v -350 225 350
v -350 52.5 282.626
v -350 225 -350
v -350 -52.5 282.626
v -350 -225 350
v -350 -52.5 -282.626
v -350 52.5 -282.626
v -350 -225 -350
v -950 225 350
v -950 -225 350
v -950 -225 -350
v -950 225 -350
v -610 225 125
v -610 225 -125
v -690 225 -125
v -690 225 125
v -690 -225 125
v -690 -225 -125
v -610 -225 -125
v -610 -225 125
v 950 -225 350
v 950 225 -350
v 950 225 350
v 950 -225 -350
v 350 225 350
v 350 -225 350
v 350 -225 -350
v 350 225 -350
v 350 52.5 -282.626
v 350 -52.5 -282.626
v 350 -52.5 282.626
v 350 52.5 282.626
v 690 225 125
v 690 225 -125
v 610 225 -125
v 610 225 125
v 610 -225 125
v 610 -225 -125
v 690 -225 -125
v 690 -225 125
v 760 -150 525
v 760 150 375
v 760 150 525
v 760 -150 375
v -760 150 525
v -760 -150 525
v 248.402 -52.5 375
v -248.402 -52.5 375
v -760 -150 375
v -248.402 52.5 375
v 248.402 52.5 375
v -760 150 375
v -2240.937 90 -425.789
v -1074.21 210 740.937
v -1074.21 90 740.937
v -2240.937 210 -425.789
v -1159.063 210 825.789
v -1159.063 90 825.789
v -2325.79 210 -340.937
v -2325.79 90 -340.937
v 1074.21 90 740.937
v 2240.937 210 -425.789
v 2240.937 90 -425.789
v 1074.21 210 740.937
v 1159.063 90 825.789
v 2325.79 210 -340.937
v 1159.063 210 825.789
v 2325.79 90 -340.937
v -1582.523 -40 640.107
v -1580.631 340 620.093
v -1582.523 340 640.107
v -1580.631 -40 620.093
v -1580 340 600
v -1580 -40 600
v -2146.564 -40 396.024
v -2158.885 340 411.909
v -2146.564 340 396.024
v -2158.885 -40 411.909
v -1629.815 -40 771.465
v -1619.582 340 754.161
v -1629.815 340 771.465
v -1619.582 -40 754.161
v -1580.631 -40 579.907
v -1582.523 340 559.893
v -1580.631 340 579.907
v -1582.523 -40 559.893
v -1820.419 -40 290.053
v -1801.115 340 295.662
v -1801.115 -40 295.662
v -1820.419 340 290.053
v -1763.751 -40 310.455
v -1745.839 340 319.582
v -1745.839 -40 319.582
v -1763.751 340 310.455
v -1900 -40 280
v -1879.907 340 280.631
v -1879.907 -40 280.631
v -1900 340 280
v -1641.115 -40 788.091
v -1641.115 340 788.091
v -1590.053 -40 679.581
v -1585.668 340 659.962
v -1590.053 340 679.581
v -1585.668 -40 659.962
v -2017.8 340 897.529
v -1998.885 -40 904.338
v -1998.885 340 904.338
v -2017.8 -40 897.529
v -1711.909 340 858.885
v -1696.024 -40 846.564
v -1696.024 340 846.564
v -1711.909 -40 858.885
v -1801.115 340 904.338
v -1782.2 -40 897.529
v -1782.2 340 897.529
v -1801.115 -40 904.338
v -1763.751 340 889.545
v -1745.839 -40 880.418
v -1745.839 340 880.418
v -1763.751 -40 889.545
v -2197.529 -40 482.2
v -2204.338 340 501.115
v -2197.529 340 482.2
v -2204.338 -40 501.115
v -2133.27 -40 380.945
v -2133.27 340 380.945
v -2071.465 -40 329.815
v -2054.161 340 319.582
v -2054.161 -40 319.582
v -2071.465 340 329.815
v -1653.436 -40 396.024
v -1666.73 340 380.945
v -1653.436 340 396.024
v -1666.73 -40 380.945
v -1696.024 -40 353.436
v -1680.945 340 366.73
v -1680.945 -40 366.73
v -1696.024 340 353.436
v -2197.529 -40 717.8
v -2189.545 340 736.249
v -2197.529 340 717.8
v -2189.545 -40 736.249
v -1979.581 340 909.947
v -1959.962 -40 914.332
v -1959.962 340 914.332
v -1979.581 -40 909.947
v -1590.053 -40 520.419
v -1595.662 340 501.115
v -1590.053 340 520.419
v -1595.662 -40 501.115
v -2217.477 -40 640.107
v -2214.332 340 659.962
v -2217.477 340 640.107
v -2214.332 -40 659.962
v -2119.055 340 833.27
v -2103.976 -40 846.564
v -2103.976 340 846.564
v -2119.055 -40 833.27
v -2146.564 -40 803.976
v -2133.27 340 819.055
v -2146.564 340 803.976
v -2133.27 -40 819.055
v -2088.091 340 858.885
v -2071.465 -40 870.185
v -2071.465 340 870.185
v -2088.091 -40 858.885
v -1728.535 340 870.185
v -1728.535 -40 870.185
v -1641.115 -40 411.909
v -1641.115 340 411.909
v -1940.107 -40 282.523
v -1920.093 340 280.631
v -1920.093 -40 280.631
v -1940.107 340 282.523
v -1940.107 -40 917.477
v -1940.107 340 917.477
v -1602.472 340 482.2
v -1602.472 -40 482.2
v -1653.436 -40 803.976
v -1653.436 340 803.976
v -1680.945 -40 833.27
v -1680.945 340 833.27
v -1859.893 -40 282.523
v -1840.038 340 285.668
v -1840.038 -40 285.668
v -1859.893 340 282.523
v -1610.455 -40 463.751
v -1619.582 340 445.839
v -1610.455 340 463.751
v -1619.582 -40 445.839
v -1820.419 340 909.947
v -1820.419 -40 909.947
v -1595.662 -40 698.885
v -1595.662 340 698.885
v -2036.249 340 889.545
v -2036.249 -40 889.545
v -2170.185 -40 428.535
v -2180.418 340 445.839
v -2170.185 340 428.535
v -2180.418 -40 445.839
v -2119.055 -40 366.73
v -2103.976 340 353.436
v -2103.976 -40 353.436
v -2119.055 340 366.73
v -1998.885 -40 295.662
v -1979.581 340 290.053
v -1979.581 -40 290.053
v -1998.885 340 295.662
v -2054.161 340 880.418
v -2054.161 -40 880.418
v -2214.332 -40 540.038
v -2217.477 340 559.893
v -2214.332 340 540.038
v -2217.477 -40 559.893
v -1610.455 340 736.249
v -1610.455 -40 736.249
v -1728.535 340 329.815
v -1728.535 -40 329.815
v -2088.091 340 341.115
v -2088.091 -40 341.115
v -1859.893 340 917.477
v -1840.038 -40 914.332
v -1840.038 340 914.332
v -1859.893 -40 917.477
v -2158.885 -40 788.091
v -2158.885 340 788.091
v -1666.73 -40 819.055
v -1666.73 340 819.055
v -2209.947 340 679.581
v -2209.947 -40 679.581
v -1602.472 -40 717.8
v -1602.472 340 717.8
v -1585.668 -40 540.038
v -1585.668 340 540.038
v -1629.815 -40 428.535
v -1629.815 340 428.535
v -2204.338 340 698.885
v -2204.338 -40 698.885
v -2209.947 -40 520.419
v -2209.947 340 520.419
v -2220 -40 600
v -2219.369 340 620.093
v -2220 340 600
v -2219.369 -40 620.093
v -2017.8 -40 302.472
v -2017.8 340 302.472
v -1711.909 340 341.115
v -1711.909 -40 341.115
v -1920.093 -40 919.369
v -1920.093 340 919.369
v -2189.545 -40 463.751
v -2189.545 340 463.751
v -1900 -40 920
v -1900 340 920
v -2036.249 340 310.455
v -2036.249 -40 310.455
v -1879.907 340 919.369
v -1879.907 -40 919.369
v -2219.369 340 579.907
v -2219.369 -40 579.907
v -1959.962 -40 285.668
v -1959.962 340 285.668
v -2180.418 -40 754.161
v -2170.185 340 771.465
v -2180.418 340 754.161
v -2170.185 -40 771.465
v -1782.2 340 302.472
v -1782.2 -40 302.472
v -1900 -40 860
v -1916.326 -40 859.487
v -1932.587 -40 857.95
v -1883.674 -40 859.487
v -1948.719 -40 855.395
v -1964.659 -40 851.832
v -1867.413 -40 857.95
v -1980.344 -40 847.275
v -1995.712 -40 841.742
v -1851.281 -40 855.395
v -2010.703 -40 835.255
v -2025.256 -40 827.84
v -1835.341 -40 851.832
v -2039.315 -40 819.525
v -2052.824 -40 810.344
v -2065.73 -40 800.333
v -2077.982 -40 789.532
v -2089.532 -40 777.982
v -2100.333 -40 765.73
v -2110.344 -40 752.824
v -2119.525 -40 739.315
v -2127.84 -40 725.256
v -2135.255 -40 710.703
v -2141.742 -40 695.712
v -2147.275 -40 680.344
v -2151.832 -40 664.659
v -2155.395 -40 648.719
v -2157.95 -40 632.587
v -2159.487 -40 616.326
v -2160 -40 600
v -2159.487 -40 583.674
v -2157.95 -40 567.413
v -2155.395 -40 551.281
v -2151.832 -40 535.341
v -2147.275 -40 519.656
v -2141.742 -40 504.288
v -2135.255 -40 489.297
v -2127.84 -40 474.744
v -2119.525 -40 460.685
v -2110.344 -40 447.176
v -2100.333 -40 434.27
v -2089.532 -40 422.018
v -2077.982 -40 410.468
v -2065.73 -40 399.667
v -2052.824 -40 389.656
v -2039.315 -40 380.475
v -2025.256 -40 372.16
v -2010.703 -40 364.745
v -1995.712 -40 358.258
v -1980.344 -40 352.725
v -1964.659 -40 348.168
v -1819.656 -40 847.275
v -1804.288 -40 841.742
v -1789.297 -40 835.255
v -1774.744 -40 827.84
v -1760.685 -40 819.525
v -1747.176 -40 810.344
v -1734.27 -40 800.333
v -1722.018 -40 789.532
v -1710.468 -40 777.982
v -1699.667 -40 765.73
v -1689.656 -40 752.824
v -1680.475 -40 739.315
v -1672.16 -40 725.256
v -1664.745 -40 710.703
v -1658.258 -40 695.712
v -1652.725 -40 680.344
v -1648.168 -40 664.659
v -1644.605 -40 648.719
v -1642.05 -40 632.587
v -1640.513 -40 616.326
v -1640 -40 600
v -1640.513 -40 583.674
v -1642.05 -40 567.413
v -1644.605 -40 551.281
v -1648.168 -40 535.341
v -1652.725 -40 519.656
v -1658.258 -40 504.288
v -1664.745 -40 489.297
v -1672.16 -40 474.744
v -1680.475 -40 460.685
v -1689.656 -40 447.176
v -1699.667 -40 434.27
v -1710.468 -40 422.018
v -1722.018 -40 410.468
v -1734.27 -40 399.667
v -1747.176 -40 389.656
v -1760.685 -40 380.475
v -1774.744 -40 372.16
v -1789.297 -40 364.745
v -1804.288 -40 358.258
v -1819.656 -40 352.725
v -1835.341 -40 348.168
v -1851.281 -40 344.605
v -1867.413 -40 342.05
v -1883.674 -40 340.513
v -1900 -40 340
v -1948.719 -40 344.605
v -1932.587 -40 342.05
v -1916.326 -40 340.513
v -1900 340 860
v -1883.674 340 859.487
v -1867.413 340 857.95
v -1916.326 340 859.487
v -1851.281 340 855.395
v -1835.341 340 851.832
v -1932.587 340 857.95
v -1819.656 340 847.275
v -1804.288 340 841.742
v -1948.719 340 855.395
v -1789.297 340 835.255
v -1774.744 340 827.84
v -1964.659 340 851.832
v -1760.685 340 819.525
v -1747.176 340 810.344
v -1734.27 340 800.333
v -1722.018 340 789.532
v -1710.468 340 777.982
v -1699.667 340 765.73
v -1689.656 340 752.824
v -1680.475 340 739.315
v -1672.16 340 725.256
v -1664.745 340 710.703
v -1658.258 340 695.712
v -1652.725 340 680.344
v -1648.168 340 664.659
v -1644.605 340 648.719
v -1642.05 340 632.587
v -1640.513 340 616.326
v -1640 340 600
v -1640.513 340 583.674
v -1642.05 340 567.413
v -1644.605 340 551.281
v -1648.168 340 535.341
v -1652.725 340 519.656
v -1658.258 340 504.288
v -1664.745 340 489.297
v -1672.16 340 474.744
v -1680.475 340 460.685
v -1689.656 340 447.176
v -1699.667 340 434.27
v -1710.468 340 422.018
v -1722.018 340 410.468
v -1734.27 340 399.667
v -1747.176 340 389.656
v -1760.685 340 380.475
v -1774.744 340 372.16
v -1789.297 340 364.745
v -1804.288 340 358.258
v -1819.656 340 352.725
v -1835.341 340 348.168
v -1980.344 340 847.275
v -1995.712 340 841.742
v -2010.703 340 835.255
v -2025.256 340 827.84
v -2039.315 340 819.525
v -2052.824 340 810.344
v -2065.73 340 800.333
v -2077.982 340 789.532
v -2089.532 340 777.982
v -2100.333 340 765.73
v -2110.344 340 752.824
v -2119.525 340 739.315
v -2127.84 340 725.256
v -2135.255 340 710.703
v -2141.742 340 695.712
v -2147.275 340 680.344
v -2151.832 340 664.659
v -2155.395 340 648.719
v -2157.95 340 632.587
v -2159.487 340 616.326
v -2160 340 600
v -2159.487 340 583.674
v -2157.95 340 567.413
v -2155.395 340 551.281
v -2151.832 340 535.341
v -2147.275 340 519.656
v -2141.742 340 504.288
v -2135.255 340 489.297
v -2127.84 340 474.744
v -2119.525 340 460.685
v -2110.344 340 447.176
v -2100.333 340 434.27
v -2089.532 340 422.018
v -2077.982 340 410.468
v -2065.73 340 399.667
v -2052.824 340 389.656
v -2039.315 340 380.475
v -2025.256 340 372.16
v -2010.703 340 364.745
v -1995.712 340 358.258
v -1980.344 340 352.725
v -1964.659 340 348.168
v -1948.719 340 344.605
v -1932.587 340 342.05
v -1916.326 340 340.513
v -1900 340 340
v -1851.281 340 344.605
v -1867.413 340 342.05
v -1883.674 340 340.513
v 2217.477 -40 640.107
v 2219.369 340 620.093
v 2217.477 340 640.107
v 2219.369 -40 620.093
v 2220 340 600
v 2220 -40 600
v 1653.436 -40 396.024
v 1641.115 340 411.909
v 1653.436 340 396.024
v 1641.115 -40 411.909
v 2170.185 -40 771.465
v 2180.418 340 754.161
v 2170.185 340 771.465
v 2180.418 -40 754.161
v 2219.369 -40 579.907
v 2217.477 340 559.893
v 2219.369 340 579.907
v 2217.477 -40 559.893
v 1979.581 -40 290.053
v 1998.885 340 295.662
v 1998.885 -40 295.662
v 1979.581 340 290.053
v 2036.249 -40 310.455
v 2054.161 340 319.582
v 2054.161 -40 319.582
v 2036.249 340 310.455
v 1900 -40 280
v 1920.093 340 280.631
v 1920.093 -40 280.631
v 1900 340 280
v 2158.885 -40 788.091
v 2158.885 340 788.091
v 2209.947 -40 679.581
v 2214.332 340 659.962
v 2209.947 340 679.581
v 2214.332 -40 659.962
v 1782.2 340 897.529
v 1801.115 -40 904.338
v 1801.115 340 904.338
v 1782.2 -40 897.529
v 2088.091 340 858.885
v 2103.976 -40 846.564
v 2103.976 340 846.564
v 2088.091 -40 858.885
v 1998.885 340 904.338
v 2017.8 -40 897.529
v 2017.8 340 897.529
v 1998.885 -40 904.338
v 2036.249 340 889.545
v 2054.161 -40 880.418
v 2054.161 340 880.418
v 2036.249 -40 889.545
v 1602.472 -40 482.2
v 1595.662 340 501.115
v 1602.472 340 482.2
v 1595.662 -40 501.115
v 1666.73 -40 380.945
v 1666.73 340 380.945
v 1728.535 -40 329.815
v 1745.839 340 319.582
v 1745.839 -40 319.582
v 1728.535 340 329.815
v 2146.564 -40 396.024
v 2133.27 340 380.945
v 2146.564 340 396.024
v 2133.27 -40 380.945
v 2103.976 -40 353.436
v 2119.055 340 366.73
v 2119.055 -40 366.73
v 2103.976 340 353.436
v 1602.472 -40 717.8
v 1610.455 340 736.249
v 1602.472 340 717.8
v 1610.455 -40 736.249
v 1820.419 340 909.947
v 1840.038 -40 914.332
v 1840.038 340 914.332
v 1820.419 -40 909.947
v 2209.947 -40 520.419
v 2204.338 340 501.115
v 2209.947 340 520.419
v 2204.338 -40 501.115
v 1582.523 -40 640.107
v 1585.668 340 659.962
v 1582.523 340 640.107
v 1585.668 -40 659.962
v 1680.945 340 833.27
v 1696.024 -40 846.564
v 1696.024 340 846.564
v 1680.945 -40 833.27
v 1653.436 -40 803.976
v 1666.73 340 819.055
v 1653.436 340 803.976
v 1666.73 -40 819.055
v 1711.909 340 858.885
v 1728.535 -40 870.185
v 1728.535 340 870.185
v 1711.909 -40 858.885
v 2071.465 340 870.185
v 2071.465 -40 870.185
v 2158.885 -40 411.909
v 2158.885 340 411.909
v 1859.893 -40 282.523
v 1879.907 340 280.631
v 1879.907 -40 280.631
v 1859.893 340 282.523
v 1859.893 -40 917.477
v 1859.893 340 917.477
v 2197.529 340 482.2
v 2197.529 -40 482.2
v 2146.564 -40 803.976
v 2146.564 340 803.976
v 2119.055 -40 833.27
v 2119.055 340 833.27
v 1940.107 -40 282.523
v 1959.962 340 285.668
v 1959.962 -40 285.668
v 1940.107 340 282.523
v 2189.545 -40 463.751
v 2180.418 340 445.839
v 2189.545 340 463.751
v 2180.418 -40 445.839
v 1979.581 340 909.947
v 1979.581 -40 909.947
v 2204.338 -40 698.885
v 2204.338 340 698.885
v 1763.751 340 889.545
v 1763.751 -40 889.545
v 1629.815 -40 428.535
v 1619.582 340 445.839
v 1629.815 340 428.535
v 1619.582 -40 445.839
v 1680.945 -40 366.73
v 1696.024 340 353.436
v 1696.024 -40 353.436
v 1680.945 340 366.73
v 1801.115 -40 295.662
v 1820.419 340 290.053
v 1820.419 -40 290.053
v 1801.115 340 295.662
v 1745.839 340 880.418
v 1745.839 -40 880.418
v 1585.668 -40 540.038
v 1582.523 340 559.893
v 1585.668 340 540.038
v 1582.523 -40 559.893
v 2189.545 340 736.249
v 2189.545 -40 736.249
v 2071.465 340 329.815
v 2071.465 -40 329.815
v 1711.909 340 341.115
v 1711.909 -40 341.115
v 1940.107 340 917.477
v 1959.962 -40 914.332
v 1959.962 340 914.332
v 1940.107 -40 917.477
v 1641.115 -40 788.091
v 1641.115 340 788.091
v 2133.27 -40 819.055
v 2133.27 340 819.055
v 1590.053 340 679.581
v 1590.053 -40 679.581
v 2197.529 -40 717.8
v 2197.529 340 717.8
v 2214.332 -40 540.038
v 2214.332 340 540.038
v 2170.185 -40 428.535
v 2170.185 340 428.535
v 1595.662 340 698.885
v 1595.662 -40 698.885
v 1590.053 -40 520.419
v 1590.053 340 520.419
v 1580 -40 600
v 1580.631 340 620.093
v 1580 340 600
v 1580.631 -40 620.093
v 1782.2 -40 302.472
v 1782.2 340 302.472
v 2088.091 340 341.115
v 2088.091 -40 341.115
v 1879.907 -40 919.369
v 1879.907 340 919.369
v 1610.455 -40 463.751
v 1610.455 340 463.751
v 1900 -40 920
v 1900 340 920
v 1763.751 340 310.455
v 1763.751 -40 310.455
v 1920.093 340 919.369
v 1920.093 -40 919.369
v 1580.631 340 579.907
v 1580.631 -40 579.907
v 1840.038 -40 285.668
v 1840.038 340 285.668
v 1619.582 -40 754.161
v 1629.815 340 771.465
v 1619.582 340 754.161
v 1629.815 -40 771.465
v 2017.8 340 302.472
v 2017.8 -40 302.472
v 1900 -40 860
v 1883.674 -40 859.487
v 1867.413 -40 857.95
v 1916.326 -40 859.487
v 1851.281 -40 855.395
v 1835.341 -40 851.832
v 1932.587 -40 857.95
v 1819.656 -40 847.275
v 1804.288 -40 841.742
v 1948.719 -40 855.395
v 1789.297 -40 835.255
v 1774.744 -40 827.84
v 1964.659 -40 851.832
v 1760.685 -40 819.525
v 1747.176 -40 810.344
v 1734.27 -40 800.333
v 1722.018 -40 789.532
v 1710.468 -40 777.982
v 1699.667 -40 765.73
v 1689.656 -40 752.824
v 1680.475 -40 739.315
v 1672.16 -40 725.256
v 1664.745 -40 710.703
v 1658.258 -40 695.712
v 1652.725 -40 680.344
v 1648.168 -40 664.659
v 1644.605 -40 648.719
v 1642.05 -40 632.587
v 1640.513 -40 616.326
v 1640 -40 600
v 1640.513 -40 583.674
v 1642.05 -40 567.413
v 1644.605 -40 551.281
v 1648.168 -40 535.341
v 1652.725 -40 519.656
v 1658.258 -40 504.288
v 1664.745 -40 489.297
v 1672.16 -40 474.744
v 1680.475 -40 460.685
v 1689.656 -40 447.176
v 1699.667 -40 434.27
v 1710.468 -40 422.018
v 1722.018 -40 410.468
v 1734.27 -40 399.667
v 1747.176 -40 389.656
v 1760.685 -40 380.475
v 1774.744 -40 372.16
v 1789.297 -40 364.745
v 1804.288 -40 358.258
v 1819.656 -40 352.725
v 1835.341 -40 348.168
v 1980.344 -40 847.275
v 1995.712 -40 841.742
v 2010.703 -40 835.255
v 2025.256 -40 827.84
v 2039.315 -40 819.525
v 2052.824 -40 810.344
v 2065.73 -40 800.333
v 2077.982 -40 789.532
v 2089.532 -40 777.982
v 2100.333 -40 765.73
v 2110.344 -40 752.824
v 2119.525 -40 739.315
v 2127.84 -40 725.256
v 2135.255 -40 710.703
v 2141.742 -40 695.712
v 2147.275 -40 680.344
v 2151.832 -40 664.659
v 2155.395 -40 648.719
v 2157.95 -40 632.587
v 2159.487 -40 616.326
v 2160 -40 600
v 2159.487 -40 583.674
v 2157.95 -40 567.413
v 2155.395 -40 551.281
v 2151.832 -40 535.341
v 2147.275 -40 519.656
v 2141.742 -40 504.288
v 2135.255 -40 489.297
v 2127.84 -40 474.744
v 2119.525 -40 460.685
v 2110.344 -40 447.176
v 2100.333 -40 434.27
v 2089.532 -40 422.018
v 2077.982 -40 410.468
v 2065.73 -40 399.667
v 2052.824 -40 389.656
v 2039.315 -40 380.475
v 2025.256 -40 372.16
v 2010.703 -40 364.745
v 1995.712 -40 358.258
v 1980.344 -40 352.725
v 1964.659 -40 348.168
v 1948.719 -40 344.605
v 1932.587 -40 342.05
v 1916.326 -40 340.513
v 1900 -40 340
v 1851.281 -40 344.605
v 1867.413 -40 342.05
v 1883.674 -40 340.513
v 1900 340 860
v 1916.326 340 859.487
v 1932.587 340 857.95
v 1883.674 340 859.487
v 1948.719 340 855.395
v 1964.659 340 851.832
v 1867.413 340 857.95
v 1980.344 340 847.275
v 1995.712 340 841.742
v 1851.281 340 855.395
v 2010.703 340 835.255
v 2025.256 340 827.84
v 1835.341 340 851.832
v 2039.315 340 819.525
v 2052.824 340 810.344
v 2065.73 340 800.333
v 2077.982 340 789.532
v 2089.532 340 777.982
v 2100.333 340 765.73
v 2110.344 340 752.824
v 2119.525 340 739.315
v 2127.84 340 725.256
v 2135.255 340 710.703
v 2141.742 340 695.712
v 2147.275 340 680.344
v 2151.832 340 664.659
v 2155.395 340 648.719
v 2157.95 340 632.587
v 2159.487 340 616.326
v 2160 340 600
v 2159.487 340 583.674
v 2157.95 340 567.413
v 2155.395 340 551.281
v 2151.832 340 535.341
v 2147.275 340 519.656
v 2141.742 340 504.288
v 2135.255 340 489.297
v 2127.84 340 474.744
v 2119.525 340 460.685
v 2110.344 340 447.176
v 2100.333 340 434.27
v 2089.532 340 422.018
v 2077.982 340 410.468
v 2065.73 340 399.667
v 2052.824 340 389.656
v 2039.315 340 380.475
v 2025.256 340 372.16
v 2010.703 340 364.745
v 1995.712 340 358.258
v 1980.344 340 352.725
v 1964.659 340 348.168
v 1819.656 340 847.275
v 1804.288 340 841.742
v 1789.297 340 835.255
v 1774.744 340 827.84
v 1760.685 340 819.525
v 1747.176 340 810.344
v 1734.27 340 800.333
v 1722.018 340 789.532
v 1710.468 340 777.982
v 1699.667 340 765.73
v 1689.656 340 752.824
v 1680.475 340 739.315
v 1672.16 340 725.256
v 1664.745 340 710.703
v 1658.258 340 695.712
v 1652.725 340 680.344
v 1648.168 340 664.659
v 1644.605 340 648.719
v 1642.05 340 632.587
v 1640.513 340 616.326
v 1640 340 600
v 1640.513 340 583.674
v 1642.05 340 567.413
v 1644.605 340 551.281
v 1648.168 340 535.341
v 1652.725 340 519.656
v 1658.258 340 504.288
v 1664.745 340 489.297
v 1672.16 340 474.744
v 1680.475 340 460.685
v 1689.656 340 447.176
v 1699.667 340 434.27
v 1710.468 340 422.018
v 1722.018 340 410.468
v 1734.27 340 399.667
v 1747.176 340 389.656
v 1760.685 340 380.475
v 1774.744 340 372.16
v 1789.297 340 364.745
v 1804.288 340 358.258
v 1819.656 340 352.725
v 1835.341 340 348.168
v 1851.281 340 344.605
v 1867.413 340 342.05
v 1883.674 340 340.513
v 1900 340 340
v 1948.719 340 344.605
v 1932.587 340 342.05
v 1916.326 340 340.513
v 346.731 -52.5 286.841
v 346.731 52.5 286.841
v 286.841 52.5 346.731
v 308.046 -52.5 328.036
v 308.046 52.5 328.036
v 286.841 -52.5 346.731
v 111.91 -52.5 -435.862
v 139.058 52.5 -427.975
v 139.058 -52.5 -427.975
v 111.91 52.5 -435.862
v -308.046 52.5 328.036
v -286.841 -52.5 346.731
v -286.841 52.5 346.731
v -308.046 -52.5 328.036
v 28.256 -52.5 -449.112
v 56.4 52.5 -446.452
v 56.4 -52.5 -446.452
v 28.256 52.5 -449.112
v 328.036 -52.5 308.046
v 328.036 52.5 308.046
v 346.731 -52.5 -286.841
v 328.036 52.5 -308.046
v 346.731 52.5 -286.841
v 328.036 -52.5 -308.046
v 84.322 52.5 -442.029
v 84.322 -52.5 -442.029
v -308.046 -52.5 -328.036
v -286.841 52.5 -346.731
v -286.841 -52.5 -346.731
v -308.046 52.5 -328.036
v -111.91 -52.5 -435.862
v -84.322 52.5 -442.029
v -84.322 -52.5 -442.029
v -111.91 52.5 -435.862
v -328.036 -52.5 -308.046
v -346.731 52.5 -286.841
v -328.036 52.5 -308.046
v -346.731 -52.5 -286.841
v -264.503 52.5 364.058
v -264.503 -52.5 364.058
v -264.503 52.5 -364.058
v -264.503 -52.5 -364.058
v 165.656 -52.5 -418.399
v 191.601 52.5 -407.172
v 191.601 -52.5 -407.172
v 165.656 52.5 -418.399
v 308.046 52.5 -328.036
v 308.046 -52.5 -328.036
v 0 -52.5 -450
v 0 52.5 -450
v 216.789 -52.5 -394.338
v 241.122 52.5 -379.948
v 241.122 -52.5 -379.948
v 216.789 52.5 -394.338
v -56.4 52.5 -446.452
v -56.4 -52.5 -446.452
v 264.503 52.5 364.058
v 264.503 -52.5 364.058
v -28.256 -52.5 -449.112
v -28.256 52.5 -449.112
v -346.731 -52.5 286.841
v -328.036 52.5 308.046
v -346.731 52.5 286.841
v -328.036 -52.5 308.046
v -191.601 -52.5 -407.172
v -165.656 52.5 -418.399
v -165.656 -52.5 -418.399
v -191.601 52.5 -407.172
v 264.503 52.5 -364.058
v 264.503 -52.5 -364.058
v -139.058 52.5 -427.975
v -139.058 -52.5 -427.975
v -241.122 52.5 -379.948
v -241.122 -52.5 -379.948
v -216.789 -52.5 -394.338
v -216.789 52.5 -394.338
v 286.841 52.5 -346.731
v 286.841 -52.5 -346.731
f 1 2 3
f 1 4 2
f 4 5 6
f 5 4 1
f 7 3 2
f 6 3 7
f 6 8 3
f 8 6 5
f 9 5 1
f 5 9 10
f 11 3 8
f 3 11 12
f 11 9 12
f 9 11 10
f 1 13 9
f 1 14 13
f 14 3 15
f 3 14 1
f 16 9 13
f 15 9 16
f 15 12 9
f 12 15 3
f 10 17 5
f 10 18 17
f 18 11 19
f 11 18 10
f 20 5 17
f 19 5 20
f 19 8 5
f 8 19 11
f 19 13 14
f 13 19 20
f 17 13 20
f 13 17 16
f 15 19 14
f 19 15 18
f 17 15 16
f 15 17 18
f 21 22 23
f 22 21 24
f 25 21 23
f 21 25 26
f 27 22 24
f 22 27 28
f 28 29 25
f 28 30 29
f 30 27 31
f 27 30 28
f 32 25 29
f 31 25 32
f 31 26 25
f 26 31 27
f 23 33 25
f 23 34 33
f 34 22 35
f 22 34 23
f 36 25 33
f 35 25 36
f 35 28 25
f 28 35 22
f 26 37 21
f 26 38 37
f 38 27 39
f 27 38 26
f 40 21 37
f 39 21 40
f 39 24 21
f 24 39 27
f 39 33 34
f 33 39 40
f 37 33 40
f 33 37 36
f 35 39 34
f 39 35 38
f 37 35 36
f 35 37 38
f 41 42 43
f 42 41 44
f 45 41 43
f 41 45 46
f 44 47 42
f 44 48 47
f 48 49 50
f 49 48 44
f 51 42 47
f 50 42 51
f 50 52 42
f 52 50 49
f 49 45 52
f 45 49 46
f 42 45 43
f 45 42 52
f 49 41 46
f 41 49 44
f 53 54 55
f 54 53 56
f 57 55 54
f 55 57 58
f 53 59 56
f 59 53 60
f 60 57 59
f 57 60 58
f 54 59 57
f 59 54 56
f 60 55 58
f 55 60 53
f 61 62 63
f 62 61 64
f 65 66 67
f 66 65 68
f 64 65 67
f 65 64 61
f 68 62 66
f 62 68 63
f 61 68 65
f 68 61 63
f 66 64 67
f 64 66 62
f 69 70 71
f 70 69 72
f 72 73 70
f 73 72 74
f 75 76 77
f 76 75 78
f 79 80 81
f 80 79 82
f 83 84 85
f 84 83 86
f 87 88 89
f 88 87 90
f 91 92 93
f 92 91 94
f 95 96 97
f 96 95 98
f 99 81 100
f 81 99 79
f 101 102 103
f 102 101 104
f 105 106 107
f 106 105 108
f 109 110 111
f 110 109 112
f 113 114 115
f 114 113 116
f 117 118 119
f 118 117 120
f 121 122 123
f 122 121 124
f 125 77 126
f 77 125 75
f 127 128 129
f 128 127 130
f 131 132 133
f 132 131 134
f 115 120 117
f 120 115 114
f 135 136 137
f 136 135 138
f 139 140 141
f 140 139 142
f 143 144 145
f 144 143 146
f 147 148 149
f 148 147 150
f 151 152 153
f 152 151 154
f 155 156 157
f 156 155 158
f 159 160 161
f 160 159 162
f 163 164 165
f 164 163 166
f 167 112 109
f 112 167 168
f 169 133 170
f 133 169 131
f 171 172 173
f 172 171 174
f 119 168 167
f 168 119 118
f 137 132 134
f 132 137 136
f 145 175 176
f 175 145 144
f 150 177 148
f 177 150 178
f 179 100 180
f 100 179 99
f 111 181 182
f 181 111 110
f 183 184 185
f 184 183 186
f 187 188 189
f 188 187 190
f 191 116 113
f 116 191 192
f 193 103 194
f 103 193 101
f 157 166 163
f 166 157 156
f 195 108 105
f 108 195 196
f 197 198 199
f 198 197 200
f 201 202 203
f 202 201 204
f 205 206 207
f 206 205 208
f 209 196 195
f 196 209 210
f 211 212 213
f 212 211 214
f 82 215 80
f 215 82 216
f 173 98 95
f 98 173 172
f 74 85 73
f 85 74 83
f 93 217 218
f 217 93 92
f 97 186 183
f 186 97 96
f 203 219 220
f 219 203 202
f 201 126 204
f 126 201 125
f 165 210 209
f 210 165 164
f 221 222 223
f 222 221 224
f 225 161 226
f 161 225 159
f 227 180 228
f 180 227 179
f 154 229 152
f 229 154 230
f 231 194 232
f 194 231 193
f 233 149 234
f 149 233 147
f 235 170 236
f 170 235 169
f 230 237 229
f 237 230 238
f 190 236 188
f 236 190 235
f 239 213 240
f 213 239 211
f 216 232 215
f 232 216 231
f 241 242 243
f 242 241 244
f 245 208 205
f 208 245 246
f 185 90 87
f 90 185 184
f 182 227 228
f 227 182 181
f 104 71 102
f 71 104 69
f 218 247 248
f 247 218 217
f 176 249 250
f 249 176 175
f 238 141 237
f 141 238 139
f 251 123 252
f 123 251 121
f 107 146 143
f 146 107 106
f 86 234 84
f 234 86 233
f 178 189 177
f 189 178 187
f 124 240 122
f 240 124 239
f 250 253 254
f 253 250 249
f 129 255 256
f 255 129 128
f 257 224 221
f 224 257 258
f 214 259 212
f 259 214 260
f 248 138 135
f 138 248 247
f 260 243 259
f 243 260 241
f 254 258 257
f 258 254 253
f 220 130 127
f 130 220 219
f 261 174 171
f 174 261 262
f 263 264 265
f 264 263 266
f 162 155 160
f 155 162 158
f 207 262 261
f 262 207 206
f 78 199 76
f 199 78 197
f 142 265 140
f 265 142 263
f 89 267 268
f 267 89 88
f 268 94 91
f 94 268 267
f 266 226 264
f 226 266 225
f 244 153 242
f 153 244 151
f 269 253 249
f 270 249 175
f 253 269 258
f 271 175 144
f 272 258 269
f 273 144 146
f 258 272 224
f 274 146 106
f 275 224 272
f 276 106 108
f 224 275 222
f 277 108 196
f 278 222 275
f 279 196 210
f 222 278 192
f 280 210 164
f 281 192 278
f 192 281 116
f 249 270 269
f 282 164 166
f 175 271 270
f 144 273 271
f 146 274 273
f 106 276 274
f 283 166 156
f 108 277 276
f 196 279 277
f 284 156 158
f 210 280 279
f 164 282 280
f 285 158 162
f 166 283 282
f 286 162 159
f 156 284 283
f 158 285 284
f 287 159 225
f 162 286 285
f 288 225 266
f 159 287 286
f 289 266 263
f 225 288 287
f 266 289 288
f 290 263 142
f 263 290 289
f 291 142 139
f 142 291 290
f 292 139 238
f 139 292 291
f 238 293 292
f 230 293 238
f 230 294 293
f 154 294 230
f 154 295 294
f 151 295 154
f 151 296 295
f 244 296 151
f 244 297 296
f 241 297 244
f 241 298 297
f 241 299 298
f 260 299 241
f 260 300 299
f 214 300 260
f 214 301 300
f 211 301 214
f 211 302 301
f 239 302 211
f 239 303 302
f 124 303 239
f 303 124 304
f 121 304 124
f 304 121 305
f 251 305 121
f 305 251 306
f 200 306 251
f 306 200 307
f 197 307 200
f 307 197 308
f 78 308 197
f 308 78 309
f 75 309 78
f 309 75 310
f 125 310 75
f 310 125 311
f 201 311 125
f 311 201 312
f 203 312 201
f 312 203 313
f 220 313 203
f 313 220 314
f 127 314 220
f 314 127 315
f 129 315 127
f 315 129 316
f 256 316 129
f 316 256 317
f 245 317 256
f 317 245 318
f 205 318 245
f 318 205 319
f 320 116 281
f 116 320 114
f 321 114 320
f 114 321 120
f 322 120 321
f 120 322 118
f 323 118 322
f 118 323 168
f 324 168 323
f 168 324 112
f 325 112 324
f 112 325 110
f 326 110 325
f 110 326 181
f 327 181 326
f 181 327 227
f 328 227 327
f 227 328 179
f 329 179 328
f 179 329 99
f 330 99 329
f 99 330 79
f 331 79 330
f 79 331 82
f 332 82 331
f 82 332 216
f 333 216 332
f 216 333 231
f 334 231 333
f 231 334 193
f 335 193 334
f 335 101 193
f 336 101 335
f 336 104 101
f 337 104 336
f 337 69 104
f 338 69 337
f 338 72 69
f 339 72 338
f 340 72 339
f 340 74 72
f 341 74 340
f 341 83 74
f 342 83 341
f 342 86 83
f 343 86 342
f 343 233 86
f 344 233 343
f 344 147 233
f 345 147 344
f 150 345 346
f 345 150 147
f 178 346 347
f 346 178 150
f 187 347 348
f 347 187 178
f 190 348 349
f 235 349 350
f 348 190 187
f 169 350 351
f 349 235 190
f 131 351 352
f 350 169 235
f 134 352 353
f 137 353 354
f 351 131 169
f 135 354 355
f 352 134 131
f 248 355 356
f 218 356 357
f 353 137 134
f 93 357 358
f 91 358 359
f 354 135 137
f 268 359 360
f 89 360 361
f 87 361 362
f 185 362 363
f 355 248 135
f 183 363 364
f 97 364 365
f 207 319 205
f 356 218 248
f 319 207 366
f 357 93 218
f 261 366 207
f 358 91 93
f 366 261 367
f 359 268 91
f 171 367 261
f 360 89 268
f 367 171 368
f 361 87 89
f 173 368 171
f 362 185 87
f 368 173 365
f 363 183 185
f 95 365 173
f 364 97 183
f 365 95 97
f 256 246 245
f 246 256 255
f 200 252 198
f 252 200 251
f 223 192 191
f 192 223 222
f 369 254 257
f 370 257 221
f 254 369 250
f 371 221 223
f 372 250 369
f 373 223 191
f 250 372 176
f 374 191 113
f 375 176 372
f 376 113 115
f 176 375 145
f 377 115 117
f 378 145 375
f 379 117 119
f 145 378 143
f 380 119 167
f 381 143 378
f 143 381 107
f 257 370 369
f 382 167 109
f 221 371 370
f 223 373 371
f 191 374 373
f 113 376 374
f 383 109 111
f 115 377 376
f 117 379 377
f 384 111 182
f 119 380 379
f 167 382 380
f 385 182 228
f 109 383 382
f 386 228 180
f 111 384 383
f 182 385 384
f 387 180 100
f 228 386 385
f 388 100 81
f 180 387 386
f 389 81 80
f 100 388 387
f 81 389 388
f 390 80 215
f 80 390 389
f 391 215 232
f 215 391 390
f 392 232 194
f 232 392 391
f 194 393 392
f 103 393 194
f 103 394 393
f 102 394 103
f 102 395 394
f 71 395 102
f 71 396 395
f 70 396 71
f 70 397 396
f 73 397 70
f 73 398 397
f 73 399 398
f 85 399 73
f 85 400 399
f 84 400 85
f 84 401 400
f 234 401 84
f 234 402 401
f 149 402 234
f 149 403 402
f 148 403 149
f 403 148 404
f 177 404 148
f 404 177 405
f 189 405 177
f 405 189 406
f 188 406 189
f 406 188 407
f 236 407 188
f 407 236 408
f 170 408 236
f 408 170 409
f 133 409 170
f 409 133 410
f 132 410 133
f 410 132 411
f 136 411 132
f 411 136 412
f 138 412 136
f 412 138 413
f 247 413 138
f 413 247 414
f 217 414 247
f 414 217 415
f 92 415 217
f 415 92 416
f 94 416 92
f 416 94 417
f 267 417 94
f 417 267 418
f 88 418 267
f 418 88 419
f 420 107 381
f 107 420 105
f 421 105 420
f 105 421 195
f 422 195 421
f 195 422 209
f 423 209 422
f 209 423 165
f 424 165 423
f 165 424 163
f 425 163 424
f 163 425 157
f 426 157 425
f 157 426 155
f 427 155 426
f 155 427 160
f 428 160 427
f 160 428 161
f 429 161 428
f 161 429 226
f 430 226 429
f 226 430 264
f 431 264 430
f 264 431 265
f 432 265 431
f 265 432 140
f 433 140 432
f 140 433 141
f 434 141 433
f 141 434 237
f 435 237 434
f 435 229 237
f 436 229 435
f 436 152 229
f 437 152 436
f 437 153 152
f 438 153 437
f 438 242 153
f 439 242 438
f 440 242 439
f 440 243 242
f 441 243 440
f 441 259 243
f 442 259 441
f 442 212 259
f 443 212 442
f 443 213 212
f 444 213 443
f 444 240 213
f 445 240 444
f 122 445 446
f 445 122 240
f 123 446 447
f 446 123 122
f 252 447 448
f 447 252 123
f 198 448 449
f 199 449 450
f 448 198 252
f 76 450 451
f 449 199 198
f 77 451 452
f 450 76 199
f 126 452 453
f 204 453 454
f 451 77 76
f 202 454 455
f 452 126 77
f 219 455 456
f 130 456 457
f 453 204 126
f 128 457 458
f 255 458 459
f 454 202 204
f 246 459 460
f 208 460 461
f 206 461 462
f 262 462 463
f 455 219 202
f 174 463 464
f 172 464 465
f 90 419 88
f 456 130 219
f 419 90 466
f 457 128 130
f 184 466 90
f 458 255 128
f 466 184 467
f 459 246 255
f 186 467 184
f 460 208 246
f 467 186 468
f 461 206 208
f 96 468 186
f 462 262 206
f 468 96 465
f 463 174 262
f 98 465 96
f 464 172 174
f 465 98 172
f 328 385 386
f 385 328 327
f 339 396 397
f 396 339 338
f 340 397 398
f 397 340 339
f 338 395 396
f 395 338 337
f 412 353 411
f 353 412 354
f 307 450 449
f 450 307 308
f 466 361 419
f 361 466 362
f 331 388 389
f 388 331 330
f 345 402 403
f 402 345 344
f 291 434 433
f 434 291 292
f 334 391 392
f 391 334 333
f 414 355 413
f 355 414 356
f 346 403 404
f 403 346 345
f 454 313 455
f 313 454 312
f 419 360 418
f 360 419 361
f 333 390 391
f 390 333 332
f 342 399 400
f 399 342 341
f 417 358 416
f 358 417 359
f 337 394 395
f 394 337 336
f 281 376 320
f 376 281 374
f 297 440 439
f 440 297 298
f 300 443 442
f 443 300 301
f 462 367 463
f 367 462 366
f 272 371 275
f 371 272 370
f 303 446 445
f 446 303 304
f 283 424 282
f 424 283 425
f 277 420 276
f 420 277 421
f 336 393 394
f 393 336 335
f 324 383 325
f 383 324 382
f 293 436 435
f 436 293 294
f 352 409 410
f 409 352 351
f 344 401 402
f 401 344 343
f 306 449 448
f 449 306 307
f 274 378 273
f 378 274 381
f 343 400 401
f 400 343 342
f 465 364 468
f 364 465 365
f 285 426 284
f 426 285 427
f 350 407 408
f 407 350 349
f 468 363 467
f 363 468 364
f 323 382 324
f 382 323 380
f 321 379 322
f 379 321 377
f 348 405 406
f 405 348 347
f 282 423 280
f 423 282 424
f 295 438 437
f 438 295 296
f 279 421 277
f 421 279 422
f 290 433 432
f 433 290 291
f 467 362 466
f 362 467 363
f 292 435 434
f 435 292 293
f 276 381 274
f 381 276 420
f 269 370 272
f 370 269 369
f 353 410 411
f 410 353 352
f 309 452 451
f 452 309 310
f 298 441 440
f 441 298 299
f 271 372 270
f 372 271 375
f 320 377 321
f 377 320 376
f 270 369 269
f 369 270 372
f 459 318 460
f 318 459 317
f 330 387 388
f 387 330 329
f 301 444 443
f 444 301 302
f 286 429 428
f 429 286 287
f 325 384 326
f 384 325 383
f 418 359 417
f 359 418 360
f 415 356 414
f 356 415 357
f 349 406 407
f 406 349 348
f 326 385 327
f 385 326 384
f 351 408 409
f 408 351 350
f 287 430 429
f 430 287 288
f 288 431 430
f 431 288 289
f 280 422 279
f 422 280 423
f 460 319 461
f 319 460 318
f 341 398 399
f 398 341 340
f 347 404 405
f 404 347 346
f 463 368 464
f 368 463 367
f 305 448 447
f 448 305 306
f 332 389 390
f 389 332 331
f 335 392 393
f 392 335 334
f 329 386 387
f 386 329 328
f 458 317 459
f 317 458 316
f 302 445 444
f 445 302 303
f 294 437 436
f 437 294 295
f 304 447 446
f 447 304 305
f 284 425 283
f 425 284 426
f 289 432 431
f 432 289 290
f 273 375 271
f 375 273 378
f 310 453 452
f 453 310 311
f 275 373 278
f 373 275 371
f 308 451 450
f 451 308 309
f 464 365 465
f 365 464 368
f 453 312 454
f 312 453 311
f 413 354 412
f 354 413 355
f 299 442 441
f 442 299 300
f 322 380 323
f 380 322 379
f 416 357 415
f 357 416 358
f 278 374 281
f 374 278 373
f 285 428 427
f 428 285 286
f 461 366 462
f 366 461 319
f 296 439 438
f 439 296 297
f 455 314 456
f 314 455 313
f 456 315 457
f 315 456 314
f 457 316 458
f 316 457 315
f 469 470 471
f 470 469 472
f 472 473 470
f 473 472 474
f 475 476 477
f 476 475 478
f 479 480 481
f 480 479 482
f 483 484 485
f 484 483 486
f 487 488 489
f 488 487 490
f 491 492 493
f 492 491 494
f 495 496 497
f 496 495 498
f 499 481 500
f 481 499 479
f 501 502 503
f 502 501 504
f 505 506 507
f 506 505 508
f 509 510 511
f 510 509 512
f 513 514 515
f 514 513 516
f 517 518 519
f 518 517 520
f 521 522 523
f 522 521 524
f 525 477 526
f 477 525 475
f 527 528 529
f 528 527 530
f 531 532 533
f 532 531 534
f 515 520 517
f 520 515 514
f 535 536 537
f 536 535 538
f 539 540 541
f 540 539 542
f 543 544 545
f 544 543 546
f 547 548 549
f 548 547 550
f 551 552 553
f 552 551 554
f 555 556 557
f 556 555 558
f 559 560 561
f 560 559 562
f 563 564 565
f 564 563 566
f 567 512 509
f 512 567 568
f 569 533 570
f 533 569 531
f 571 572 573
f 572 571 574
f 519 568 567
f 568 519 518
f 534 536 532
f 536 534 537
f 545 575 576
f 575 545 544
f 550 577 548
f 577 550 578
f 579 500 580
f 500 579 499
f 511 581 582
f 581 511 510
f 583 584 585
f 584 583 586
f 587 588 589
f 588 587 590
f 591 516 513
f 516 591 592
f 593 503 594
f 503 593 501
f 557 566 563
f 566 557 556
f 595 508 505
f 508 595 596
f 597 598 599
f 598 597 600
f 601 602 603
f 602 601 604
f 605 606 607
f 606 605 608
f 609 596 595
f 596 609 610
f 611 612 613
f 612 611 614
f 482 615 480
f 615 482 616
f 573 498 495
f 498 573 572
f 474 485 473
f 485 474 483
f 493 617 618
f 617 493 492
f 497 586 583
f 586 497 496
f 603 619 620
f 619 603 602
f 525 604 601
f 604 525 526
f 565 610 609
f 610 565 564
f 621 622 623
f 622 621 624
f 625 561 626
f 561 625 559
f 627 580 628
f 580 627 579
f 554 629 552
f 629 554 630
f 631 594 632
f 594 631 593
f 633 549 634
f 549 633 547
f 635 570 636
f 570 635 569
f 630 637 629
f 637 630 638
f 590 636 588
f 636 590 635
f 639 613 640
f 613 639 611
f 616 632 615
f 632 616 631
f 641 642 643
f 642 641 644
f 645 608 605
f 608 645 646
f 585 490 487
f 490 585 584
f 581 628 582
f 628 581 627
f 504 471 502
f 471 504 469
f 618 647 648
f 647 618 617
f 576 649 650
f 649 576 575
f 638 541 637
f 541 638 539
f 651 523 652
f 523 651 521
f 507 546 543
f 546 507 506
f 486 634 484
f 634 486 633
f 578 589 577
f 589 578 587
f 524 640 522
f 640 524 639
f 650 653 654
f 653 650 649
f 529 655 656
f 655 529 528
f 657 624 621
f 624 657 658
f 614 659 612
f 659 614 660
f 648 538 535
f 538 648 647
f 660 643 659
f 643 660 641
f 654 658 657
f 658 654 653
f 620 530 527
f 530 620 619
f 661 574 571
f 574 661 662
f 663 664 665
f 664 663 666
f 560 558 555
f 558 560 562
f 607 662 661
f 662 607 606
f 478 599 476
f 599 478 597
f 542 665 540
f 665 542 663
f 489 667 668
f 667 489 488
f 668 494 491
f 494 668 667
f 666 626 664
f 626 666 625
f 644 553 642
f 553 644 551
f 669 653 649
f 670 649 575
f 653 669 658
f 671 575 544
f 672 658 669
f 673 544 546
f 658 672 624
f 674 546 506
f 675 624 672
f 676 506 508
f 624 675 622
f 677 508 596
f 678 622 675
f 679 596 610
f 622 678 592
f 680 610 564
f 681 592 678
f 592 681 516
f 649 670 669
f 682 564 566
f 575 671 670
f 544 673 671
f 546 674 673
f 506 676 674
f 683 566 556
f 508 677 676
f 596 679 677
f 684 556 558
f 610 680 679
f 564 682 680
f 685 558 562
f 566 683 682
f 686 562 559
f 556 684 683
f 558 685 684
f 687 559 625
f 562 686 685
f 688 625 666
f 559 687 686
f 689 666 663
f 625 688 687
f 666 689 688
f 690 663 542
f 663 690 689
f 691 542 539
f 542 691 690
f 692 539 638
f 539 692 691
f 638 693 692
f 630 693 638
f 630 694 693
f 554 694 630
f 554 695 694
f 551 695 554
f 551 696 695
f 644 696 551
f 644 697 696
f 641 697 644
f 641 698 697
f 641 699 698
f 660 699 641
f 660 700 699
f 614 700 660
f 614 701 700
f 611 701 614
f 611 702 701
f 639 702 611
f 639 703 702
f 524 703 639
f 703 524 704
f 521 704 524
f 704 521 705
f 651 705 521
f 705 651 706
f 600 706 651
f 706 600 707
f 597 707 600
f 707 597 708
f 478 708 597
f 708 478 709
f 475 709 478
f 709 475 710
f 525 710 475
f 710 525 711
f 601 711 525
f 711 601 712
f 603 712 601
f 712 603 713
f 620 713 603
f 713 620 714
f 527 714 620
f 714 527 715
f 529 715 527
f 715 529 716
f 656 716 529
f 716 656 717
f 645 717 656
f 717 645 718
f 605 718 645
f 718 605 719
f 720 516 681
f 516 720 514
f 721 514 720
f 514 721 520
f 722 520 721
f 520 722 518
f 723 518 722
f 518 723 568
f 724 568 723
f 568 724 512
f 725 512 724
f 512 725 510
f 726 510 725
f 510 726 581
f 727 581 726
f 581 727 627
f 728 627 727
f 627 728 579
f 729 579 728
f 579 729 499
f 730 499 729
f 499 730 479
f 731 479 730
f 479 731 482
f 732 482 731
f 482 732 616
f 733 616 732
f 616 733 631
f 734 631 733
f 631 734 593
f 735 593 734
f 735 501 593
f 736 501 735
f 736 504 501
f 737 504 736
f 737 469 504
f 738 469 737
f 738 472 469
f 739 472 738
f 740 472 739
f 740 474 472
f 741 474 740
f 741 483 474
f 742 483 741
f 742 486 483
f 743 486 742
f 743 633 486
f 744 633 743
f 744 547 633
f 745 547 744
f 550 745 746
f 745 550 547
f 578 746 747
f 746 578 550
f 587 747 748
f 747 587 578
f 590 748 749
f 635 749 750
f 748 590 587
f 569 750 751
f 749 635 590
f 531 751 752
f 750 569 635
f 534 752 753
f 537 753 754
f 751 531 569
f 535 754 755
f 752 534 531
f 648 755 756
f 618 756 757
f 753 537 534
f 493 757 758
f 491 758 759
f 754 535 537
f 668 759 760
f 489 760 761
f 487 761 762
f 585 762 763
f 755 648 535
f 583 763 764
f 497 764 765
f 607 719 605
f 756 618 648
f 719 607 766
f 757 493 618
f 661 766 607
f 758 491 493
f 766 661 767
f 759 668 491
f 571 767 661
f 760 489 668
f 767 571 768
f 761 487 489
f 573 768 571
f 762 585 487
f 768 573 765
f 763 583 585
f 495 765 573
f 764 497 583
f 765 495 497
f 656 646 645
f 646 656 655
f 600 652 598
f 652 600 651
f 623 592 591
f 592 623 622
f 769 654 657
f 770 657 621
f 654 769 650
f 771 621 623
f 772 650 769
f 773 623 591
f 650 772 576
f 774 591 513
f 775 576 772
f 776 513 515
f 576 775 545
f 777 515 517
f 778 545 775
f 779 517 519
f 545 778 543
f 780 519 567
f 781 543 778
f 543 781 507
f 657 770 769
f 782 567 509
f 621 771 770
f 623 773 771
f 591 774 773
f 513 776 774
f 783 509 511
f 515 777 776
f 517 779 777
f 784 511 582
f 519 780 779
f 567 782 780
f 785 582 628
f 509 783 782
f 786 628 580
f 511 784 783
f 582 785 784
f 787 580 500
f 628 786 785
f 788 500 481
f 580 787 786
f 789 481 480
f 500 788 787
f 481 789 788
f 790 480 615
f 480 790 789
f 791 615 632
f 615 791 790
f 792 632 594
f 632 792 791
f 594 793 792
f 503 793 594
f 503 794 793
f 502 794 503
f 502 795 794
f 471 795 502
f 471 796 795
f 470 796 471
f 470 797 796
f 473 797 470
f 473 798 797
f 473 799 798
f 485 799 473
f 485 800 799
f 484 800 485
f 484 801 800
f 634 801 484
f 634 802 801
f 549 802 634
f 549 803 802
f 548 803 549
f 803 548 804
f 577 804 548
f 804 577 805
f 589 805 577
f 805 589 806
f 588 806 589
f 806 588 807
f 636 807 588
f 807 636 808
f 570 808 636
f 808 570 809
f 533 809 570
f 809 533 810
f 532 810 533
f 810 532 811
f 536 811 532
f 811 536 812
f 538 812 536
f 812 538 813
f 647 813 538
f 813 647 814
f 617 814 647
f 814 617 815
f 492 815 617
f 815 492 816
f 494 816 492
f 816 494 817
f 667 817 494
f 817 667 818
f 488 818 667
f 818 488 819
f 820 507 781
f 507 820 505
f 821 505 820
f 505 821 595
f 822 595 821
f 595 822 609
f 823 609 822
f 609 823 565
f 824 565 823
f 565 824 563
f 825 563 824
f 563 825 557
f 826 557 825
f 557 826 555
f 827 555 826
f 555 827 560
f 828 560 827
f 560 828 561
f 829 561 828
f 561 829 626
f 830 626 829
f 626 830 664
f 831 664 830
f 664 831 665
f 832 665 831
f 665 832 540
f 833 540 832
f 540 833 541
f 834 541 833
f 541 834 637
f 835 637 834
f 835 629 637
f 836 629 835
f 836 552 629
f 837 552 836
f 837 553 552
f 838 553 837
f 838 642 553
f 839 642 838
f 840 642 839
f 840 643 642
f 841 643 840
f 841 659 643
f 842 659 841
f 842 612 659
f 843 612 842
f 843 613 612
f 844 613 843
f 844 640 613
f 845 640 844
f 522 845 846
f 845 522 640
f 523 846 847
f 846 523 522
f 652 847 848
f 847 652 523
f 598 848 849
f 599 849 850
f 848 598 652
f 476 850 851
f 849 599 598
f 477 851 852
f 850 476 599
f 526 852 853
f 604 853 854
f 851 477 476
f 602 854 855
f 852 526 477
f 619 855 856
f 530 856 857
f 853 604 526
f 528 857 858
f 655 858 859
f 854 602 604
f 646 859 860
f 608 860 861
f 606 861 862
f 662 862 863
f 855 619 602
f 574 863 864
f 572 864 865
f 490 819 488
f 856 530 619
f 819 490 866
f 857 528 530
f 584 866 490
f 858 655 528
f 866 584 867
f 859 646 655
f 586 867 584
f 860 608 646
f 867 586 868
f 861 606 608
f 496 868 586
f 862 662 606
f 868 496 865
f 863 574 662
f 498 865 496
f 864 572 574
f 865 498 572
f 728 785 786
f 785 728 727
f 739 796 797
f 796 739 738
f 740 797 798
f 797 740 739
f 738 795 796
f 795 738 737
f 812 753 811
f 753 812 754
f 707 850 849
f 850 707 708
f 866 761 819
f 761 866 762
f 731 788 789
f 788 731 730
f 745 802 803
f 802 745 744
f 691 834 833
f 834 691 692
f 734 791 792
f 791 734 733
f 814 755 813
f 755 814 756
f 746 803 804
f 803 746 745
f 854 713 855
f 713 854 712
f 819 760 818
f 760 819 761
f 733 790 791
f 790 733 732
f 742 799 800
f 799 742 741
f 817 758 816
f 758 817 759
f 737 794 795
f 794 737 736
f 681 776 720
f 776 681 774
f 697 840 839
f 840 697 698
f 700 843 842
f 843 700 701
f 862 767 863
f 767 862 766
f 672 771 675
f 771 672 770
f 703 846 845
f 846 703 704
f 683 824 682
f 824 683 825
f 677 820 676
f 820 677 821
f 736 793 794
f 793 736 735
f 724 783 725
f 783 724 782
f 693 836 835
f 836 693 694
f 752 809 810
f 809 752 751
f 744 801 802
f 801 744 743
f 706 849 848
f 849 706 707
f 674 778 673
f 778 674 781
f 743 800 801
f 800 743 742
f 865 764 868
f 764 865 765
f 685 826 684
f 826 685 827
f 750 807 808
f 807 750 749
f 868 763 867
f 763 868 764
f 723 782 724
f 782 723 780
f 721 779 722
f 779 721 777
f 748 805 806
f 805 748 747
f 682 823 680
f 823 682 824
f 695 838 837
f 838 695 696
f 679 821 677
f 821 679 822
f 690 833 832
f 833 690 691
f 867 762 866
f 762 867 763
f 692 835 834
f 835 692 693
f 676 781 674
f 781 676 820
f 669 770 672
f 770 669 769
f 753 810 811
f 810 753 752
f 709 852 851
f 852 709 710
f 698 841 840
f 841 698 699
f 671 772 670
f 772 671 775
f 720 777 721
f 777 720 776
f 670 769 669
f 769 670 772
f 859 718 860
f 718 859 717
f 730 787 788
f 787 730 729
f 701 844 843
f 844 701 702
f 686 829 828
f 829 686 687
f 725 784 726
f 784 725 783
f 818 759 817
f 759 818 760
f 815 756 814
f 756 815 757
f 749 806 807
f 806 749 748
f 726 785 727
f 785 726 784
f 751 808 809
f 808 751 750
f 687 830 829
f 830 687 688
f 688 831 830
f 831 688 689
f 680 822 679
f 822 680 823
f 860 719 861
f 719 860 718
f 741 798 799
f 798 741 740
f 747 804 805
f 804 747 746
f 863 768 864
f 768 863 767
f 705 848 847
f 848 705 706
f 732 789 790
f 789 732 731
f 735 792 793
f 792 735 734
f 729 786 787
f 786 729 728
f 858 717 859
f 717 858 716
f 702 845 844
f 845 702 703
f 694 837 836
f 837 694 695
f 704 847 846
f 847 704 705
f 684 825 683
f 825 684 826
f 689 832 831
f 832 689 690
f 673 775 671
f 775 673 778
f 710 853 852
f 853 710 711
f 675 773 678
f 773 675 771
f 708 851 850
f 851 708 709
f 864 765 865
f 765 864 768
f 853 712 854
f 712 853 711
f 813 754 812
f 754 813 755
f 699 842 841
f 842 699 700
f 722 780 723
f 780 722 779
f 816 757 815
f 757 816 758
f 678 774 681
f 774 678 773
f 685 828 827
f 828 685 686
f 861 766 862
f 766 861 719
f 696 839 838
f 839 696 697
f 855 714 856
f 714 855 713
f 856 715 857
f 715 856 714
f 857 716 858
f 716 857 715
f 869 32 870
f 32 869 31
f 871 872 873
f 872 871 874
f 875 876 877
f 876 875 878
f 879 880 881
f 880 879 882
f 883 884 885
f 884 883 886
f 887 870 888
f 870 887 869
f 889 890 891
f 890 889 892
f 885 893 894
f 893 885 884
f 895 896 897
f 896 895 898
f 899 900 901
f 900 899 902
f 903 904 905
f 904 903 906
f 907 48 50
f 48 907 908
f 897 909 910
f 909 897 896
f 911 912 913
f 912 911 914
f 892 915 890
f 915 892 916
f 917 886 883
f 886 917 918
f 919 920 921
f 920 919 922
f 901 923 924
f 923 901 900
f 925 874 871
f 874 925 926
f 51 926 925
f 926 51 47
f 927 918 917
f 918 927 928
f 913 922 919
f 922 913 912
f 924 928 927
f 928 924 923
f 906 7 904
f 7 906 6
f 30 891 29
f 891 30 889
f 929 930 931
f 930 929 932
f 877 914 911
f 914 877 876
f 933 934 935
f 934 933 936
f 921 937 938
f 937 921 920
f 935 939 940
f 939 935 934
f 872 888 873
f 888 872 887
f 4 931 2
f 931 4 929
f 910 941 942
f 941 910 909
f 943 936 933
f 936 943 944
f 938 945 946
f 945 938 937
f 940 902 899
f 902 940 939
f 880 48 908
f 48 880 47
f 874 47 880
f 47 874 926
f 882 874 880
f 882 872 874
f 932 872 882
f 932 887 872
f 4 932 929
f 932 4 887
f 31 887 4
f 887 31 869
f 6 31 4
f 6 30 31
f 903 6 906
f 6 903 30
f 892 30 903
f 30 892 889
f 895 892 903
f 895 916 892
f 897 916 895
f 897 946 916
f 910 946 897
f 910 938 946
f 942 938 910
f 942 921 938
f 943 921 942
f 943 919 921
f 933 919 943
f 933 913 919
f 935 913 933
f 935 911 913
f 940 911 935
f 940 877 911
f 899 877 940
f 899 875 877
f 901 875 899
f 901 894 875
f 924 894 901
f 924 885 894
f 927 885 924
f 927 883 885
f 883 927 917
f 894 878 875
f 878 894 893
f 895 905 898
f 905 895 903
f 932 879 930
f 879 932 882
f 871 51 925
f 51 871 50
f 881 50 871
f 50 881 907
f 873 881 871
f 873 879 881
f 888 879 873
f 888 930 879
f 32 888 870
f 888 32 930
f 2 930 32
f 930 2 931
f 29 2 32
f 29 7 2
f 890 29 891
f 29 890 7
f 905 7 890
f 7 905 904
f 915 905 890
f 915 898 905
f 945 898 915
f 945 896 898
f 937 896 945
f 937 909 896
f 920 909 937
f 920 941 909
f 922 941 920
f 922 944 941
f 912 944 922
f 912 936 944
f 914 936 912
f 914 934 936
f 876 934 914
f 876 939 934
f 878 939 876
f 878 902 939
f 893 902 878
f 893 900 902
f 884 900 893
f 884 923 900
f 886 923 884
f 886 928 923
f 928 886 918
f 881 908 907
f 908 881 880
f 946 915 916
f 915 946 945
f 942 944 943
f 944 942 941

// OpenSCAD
// ============================================================================
// PROJECT: XXXG-00W0 WING GUNDAM ZERO EW - AIRFRAME STRUCTURAL CORE
// COMPONENTS: RUNNER G (SHOULDER COUPLERS) & RUNNER B (WING REDUCERS)
// MATERIAL BASELINE: TRANS-ALUMINUM OXYNITRIDE & SOLID TITANIUM ALLOYS
// DESIGN TARGET: 100% SQUARE-WAVE SNAP-CIRCUIT BUS REACTIONARY PROTECTION
// ============================================================================

$fn = 100; // Circular segment resolution

// Metric Scaling Parameters (1:1 Dimensions for 16.7m Mecha Scale)
shoulder_beam_width = 3800;             // Total internal frame span (mm)
wing_arm_length = 1650;                 // Longitudinal joint axis extension (mm)
clear_aluminum_diameter = 900;          // Central clear green window width (mm)
cycloidal_housing_bore = 520;           // B8 Gear box enclosure envelope (mm)
frame_core_thickness = 85;              // Main load-bearing bone wall (mm)

module Master_Torso_Junction() {
    // 1. Central Transparent Aluminum Window Matrix (The Zero Sensor Node)
    color([0.1, 0.8, 0.3, 0.4]) { // See-Through Green Ceramic Material
        rotate([90, 0, 0])
            cylinder(h = frame_core_thickness + 20, d = clear_aluminum_diameter, center = true);
    }
    
    // 2. Instantiate Connected Mechanical Runner Parts
    Build_Runner_G_Shoulders();
    Build_Runner_B_Wing_Joints();
}

module Build_Runner_G_Shoulders() {
    // ---- PARTS G1 & G2: INTERNAL SHOULDER CROSS-AXIS BRACES ---- [Page 4, Step 05-1]
    color([0.35, 0.35, 0.38]) {
        // Left Internal Brace Core (G1)
        translate([-(clear_aluminum_diameter/2 + 200), 0, 0])
            difference() {
                cube([600, 450, 700], center = true);
                // Cast-in conduit path for the 4oz solid-state wiring tracks
                cube([80, 500, 250], center = true);
            }
            
        // Right Internal Brace Core (G2)
        translate([(clear_aluminum_diameter/2 + 200), 0, 0])
            difference() {
                cube([600, 450, 700], center = true);
                cube([80, 500, 250], center = true);
            }
    }
    
    // ---- PART G10: MULTI-AXIS ALIGNMENT EXTENSION LINK ---- [Page 4, Step 05-1]
    color([0.4, 0.4, 0.42]) {
        translate([0, 0, 450])
            cube([shoulder_beam_width * 0.4, 300, 150], center = true);
    }
}

module Build_Runner_B_Wing_Joints() {
    // ---- PARTS B1 & B2: WING JOINT ARTICULATION MECHANISMS ---- [Page 5, Step 06-1]
    color([0.7, 0.7, 0.72]) {
        // Left Wing Extension Arm Rod (B1)
        translate([-(shoulder_beam_width/2 - 200), 150, 200])
            rotate([0, 45, 0])
                cube([120, 120, wing_arm_length], center = true);
                
        // Right Wing Extension Arm Rod (B2)
        translate([(shoulder_beam_width/2 - 200), 150, 200])
            rotate([0, -45, 0])
                cube([120, 120, wing_arm_length], center = true);
    }
    
    // ---- PART B8: REINFORCED CYCLOIDAL REDUCER ENCLOSURE ---- [Page 5, Step 06-2]
    // Houses the high-torque crown rollers to eliminate gear tooth backlash
    translate([-(shoulder_beam_width/2), 150, 600])
        rotate([90, 0, 0])
            color([0.5, 0.5, 0.55]) {
                difference() {
                    cylinder(h = 380, d = cycloidal_housing_bore + 120, center = true);
                    cylinder(h = 400, d = cycloidal_housing_bore, center = true);
                }
            }
            
    translate([shoulder_beam_width/2, 150, 600])
        rotate([90, 0, 0])
            color([0.5, 0.5, 0.55]) {
                difference() {
                    cylinder(h = 380, d = cycloidal_housing_bore + 120, center = true);
                    cylinder(h = 400, d = cycloidal_housing_bore, center = true);
                }
            }
}

// Instantiate Unified Framework Assembly for Workspace Verification
Master_Torso_Junction();
